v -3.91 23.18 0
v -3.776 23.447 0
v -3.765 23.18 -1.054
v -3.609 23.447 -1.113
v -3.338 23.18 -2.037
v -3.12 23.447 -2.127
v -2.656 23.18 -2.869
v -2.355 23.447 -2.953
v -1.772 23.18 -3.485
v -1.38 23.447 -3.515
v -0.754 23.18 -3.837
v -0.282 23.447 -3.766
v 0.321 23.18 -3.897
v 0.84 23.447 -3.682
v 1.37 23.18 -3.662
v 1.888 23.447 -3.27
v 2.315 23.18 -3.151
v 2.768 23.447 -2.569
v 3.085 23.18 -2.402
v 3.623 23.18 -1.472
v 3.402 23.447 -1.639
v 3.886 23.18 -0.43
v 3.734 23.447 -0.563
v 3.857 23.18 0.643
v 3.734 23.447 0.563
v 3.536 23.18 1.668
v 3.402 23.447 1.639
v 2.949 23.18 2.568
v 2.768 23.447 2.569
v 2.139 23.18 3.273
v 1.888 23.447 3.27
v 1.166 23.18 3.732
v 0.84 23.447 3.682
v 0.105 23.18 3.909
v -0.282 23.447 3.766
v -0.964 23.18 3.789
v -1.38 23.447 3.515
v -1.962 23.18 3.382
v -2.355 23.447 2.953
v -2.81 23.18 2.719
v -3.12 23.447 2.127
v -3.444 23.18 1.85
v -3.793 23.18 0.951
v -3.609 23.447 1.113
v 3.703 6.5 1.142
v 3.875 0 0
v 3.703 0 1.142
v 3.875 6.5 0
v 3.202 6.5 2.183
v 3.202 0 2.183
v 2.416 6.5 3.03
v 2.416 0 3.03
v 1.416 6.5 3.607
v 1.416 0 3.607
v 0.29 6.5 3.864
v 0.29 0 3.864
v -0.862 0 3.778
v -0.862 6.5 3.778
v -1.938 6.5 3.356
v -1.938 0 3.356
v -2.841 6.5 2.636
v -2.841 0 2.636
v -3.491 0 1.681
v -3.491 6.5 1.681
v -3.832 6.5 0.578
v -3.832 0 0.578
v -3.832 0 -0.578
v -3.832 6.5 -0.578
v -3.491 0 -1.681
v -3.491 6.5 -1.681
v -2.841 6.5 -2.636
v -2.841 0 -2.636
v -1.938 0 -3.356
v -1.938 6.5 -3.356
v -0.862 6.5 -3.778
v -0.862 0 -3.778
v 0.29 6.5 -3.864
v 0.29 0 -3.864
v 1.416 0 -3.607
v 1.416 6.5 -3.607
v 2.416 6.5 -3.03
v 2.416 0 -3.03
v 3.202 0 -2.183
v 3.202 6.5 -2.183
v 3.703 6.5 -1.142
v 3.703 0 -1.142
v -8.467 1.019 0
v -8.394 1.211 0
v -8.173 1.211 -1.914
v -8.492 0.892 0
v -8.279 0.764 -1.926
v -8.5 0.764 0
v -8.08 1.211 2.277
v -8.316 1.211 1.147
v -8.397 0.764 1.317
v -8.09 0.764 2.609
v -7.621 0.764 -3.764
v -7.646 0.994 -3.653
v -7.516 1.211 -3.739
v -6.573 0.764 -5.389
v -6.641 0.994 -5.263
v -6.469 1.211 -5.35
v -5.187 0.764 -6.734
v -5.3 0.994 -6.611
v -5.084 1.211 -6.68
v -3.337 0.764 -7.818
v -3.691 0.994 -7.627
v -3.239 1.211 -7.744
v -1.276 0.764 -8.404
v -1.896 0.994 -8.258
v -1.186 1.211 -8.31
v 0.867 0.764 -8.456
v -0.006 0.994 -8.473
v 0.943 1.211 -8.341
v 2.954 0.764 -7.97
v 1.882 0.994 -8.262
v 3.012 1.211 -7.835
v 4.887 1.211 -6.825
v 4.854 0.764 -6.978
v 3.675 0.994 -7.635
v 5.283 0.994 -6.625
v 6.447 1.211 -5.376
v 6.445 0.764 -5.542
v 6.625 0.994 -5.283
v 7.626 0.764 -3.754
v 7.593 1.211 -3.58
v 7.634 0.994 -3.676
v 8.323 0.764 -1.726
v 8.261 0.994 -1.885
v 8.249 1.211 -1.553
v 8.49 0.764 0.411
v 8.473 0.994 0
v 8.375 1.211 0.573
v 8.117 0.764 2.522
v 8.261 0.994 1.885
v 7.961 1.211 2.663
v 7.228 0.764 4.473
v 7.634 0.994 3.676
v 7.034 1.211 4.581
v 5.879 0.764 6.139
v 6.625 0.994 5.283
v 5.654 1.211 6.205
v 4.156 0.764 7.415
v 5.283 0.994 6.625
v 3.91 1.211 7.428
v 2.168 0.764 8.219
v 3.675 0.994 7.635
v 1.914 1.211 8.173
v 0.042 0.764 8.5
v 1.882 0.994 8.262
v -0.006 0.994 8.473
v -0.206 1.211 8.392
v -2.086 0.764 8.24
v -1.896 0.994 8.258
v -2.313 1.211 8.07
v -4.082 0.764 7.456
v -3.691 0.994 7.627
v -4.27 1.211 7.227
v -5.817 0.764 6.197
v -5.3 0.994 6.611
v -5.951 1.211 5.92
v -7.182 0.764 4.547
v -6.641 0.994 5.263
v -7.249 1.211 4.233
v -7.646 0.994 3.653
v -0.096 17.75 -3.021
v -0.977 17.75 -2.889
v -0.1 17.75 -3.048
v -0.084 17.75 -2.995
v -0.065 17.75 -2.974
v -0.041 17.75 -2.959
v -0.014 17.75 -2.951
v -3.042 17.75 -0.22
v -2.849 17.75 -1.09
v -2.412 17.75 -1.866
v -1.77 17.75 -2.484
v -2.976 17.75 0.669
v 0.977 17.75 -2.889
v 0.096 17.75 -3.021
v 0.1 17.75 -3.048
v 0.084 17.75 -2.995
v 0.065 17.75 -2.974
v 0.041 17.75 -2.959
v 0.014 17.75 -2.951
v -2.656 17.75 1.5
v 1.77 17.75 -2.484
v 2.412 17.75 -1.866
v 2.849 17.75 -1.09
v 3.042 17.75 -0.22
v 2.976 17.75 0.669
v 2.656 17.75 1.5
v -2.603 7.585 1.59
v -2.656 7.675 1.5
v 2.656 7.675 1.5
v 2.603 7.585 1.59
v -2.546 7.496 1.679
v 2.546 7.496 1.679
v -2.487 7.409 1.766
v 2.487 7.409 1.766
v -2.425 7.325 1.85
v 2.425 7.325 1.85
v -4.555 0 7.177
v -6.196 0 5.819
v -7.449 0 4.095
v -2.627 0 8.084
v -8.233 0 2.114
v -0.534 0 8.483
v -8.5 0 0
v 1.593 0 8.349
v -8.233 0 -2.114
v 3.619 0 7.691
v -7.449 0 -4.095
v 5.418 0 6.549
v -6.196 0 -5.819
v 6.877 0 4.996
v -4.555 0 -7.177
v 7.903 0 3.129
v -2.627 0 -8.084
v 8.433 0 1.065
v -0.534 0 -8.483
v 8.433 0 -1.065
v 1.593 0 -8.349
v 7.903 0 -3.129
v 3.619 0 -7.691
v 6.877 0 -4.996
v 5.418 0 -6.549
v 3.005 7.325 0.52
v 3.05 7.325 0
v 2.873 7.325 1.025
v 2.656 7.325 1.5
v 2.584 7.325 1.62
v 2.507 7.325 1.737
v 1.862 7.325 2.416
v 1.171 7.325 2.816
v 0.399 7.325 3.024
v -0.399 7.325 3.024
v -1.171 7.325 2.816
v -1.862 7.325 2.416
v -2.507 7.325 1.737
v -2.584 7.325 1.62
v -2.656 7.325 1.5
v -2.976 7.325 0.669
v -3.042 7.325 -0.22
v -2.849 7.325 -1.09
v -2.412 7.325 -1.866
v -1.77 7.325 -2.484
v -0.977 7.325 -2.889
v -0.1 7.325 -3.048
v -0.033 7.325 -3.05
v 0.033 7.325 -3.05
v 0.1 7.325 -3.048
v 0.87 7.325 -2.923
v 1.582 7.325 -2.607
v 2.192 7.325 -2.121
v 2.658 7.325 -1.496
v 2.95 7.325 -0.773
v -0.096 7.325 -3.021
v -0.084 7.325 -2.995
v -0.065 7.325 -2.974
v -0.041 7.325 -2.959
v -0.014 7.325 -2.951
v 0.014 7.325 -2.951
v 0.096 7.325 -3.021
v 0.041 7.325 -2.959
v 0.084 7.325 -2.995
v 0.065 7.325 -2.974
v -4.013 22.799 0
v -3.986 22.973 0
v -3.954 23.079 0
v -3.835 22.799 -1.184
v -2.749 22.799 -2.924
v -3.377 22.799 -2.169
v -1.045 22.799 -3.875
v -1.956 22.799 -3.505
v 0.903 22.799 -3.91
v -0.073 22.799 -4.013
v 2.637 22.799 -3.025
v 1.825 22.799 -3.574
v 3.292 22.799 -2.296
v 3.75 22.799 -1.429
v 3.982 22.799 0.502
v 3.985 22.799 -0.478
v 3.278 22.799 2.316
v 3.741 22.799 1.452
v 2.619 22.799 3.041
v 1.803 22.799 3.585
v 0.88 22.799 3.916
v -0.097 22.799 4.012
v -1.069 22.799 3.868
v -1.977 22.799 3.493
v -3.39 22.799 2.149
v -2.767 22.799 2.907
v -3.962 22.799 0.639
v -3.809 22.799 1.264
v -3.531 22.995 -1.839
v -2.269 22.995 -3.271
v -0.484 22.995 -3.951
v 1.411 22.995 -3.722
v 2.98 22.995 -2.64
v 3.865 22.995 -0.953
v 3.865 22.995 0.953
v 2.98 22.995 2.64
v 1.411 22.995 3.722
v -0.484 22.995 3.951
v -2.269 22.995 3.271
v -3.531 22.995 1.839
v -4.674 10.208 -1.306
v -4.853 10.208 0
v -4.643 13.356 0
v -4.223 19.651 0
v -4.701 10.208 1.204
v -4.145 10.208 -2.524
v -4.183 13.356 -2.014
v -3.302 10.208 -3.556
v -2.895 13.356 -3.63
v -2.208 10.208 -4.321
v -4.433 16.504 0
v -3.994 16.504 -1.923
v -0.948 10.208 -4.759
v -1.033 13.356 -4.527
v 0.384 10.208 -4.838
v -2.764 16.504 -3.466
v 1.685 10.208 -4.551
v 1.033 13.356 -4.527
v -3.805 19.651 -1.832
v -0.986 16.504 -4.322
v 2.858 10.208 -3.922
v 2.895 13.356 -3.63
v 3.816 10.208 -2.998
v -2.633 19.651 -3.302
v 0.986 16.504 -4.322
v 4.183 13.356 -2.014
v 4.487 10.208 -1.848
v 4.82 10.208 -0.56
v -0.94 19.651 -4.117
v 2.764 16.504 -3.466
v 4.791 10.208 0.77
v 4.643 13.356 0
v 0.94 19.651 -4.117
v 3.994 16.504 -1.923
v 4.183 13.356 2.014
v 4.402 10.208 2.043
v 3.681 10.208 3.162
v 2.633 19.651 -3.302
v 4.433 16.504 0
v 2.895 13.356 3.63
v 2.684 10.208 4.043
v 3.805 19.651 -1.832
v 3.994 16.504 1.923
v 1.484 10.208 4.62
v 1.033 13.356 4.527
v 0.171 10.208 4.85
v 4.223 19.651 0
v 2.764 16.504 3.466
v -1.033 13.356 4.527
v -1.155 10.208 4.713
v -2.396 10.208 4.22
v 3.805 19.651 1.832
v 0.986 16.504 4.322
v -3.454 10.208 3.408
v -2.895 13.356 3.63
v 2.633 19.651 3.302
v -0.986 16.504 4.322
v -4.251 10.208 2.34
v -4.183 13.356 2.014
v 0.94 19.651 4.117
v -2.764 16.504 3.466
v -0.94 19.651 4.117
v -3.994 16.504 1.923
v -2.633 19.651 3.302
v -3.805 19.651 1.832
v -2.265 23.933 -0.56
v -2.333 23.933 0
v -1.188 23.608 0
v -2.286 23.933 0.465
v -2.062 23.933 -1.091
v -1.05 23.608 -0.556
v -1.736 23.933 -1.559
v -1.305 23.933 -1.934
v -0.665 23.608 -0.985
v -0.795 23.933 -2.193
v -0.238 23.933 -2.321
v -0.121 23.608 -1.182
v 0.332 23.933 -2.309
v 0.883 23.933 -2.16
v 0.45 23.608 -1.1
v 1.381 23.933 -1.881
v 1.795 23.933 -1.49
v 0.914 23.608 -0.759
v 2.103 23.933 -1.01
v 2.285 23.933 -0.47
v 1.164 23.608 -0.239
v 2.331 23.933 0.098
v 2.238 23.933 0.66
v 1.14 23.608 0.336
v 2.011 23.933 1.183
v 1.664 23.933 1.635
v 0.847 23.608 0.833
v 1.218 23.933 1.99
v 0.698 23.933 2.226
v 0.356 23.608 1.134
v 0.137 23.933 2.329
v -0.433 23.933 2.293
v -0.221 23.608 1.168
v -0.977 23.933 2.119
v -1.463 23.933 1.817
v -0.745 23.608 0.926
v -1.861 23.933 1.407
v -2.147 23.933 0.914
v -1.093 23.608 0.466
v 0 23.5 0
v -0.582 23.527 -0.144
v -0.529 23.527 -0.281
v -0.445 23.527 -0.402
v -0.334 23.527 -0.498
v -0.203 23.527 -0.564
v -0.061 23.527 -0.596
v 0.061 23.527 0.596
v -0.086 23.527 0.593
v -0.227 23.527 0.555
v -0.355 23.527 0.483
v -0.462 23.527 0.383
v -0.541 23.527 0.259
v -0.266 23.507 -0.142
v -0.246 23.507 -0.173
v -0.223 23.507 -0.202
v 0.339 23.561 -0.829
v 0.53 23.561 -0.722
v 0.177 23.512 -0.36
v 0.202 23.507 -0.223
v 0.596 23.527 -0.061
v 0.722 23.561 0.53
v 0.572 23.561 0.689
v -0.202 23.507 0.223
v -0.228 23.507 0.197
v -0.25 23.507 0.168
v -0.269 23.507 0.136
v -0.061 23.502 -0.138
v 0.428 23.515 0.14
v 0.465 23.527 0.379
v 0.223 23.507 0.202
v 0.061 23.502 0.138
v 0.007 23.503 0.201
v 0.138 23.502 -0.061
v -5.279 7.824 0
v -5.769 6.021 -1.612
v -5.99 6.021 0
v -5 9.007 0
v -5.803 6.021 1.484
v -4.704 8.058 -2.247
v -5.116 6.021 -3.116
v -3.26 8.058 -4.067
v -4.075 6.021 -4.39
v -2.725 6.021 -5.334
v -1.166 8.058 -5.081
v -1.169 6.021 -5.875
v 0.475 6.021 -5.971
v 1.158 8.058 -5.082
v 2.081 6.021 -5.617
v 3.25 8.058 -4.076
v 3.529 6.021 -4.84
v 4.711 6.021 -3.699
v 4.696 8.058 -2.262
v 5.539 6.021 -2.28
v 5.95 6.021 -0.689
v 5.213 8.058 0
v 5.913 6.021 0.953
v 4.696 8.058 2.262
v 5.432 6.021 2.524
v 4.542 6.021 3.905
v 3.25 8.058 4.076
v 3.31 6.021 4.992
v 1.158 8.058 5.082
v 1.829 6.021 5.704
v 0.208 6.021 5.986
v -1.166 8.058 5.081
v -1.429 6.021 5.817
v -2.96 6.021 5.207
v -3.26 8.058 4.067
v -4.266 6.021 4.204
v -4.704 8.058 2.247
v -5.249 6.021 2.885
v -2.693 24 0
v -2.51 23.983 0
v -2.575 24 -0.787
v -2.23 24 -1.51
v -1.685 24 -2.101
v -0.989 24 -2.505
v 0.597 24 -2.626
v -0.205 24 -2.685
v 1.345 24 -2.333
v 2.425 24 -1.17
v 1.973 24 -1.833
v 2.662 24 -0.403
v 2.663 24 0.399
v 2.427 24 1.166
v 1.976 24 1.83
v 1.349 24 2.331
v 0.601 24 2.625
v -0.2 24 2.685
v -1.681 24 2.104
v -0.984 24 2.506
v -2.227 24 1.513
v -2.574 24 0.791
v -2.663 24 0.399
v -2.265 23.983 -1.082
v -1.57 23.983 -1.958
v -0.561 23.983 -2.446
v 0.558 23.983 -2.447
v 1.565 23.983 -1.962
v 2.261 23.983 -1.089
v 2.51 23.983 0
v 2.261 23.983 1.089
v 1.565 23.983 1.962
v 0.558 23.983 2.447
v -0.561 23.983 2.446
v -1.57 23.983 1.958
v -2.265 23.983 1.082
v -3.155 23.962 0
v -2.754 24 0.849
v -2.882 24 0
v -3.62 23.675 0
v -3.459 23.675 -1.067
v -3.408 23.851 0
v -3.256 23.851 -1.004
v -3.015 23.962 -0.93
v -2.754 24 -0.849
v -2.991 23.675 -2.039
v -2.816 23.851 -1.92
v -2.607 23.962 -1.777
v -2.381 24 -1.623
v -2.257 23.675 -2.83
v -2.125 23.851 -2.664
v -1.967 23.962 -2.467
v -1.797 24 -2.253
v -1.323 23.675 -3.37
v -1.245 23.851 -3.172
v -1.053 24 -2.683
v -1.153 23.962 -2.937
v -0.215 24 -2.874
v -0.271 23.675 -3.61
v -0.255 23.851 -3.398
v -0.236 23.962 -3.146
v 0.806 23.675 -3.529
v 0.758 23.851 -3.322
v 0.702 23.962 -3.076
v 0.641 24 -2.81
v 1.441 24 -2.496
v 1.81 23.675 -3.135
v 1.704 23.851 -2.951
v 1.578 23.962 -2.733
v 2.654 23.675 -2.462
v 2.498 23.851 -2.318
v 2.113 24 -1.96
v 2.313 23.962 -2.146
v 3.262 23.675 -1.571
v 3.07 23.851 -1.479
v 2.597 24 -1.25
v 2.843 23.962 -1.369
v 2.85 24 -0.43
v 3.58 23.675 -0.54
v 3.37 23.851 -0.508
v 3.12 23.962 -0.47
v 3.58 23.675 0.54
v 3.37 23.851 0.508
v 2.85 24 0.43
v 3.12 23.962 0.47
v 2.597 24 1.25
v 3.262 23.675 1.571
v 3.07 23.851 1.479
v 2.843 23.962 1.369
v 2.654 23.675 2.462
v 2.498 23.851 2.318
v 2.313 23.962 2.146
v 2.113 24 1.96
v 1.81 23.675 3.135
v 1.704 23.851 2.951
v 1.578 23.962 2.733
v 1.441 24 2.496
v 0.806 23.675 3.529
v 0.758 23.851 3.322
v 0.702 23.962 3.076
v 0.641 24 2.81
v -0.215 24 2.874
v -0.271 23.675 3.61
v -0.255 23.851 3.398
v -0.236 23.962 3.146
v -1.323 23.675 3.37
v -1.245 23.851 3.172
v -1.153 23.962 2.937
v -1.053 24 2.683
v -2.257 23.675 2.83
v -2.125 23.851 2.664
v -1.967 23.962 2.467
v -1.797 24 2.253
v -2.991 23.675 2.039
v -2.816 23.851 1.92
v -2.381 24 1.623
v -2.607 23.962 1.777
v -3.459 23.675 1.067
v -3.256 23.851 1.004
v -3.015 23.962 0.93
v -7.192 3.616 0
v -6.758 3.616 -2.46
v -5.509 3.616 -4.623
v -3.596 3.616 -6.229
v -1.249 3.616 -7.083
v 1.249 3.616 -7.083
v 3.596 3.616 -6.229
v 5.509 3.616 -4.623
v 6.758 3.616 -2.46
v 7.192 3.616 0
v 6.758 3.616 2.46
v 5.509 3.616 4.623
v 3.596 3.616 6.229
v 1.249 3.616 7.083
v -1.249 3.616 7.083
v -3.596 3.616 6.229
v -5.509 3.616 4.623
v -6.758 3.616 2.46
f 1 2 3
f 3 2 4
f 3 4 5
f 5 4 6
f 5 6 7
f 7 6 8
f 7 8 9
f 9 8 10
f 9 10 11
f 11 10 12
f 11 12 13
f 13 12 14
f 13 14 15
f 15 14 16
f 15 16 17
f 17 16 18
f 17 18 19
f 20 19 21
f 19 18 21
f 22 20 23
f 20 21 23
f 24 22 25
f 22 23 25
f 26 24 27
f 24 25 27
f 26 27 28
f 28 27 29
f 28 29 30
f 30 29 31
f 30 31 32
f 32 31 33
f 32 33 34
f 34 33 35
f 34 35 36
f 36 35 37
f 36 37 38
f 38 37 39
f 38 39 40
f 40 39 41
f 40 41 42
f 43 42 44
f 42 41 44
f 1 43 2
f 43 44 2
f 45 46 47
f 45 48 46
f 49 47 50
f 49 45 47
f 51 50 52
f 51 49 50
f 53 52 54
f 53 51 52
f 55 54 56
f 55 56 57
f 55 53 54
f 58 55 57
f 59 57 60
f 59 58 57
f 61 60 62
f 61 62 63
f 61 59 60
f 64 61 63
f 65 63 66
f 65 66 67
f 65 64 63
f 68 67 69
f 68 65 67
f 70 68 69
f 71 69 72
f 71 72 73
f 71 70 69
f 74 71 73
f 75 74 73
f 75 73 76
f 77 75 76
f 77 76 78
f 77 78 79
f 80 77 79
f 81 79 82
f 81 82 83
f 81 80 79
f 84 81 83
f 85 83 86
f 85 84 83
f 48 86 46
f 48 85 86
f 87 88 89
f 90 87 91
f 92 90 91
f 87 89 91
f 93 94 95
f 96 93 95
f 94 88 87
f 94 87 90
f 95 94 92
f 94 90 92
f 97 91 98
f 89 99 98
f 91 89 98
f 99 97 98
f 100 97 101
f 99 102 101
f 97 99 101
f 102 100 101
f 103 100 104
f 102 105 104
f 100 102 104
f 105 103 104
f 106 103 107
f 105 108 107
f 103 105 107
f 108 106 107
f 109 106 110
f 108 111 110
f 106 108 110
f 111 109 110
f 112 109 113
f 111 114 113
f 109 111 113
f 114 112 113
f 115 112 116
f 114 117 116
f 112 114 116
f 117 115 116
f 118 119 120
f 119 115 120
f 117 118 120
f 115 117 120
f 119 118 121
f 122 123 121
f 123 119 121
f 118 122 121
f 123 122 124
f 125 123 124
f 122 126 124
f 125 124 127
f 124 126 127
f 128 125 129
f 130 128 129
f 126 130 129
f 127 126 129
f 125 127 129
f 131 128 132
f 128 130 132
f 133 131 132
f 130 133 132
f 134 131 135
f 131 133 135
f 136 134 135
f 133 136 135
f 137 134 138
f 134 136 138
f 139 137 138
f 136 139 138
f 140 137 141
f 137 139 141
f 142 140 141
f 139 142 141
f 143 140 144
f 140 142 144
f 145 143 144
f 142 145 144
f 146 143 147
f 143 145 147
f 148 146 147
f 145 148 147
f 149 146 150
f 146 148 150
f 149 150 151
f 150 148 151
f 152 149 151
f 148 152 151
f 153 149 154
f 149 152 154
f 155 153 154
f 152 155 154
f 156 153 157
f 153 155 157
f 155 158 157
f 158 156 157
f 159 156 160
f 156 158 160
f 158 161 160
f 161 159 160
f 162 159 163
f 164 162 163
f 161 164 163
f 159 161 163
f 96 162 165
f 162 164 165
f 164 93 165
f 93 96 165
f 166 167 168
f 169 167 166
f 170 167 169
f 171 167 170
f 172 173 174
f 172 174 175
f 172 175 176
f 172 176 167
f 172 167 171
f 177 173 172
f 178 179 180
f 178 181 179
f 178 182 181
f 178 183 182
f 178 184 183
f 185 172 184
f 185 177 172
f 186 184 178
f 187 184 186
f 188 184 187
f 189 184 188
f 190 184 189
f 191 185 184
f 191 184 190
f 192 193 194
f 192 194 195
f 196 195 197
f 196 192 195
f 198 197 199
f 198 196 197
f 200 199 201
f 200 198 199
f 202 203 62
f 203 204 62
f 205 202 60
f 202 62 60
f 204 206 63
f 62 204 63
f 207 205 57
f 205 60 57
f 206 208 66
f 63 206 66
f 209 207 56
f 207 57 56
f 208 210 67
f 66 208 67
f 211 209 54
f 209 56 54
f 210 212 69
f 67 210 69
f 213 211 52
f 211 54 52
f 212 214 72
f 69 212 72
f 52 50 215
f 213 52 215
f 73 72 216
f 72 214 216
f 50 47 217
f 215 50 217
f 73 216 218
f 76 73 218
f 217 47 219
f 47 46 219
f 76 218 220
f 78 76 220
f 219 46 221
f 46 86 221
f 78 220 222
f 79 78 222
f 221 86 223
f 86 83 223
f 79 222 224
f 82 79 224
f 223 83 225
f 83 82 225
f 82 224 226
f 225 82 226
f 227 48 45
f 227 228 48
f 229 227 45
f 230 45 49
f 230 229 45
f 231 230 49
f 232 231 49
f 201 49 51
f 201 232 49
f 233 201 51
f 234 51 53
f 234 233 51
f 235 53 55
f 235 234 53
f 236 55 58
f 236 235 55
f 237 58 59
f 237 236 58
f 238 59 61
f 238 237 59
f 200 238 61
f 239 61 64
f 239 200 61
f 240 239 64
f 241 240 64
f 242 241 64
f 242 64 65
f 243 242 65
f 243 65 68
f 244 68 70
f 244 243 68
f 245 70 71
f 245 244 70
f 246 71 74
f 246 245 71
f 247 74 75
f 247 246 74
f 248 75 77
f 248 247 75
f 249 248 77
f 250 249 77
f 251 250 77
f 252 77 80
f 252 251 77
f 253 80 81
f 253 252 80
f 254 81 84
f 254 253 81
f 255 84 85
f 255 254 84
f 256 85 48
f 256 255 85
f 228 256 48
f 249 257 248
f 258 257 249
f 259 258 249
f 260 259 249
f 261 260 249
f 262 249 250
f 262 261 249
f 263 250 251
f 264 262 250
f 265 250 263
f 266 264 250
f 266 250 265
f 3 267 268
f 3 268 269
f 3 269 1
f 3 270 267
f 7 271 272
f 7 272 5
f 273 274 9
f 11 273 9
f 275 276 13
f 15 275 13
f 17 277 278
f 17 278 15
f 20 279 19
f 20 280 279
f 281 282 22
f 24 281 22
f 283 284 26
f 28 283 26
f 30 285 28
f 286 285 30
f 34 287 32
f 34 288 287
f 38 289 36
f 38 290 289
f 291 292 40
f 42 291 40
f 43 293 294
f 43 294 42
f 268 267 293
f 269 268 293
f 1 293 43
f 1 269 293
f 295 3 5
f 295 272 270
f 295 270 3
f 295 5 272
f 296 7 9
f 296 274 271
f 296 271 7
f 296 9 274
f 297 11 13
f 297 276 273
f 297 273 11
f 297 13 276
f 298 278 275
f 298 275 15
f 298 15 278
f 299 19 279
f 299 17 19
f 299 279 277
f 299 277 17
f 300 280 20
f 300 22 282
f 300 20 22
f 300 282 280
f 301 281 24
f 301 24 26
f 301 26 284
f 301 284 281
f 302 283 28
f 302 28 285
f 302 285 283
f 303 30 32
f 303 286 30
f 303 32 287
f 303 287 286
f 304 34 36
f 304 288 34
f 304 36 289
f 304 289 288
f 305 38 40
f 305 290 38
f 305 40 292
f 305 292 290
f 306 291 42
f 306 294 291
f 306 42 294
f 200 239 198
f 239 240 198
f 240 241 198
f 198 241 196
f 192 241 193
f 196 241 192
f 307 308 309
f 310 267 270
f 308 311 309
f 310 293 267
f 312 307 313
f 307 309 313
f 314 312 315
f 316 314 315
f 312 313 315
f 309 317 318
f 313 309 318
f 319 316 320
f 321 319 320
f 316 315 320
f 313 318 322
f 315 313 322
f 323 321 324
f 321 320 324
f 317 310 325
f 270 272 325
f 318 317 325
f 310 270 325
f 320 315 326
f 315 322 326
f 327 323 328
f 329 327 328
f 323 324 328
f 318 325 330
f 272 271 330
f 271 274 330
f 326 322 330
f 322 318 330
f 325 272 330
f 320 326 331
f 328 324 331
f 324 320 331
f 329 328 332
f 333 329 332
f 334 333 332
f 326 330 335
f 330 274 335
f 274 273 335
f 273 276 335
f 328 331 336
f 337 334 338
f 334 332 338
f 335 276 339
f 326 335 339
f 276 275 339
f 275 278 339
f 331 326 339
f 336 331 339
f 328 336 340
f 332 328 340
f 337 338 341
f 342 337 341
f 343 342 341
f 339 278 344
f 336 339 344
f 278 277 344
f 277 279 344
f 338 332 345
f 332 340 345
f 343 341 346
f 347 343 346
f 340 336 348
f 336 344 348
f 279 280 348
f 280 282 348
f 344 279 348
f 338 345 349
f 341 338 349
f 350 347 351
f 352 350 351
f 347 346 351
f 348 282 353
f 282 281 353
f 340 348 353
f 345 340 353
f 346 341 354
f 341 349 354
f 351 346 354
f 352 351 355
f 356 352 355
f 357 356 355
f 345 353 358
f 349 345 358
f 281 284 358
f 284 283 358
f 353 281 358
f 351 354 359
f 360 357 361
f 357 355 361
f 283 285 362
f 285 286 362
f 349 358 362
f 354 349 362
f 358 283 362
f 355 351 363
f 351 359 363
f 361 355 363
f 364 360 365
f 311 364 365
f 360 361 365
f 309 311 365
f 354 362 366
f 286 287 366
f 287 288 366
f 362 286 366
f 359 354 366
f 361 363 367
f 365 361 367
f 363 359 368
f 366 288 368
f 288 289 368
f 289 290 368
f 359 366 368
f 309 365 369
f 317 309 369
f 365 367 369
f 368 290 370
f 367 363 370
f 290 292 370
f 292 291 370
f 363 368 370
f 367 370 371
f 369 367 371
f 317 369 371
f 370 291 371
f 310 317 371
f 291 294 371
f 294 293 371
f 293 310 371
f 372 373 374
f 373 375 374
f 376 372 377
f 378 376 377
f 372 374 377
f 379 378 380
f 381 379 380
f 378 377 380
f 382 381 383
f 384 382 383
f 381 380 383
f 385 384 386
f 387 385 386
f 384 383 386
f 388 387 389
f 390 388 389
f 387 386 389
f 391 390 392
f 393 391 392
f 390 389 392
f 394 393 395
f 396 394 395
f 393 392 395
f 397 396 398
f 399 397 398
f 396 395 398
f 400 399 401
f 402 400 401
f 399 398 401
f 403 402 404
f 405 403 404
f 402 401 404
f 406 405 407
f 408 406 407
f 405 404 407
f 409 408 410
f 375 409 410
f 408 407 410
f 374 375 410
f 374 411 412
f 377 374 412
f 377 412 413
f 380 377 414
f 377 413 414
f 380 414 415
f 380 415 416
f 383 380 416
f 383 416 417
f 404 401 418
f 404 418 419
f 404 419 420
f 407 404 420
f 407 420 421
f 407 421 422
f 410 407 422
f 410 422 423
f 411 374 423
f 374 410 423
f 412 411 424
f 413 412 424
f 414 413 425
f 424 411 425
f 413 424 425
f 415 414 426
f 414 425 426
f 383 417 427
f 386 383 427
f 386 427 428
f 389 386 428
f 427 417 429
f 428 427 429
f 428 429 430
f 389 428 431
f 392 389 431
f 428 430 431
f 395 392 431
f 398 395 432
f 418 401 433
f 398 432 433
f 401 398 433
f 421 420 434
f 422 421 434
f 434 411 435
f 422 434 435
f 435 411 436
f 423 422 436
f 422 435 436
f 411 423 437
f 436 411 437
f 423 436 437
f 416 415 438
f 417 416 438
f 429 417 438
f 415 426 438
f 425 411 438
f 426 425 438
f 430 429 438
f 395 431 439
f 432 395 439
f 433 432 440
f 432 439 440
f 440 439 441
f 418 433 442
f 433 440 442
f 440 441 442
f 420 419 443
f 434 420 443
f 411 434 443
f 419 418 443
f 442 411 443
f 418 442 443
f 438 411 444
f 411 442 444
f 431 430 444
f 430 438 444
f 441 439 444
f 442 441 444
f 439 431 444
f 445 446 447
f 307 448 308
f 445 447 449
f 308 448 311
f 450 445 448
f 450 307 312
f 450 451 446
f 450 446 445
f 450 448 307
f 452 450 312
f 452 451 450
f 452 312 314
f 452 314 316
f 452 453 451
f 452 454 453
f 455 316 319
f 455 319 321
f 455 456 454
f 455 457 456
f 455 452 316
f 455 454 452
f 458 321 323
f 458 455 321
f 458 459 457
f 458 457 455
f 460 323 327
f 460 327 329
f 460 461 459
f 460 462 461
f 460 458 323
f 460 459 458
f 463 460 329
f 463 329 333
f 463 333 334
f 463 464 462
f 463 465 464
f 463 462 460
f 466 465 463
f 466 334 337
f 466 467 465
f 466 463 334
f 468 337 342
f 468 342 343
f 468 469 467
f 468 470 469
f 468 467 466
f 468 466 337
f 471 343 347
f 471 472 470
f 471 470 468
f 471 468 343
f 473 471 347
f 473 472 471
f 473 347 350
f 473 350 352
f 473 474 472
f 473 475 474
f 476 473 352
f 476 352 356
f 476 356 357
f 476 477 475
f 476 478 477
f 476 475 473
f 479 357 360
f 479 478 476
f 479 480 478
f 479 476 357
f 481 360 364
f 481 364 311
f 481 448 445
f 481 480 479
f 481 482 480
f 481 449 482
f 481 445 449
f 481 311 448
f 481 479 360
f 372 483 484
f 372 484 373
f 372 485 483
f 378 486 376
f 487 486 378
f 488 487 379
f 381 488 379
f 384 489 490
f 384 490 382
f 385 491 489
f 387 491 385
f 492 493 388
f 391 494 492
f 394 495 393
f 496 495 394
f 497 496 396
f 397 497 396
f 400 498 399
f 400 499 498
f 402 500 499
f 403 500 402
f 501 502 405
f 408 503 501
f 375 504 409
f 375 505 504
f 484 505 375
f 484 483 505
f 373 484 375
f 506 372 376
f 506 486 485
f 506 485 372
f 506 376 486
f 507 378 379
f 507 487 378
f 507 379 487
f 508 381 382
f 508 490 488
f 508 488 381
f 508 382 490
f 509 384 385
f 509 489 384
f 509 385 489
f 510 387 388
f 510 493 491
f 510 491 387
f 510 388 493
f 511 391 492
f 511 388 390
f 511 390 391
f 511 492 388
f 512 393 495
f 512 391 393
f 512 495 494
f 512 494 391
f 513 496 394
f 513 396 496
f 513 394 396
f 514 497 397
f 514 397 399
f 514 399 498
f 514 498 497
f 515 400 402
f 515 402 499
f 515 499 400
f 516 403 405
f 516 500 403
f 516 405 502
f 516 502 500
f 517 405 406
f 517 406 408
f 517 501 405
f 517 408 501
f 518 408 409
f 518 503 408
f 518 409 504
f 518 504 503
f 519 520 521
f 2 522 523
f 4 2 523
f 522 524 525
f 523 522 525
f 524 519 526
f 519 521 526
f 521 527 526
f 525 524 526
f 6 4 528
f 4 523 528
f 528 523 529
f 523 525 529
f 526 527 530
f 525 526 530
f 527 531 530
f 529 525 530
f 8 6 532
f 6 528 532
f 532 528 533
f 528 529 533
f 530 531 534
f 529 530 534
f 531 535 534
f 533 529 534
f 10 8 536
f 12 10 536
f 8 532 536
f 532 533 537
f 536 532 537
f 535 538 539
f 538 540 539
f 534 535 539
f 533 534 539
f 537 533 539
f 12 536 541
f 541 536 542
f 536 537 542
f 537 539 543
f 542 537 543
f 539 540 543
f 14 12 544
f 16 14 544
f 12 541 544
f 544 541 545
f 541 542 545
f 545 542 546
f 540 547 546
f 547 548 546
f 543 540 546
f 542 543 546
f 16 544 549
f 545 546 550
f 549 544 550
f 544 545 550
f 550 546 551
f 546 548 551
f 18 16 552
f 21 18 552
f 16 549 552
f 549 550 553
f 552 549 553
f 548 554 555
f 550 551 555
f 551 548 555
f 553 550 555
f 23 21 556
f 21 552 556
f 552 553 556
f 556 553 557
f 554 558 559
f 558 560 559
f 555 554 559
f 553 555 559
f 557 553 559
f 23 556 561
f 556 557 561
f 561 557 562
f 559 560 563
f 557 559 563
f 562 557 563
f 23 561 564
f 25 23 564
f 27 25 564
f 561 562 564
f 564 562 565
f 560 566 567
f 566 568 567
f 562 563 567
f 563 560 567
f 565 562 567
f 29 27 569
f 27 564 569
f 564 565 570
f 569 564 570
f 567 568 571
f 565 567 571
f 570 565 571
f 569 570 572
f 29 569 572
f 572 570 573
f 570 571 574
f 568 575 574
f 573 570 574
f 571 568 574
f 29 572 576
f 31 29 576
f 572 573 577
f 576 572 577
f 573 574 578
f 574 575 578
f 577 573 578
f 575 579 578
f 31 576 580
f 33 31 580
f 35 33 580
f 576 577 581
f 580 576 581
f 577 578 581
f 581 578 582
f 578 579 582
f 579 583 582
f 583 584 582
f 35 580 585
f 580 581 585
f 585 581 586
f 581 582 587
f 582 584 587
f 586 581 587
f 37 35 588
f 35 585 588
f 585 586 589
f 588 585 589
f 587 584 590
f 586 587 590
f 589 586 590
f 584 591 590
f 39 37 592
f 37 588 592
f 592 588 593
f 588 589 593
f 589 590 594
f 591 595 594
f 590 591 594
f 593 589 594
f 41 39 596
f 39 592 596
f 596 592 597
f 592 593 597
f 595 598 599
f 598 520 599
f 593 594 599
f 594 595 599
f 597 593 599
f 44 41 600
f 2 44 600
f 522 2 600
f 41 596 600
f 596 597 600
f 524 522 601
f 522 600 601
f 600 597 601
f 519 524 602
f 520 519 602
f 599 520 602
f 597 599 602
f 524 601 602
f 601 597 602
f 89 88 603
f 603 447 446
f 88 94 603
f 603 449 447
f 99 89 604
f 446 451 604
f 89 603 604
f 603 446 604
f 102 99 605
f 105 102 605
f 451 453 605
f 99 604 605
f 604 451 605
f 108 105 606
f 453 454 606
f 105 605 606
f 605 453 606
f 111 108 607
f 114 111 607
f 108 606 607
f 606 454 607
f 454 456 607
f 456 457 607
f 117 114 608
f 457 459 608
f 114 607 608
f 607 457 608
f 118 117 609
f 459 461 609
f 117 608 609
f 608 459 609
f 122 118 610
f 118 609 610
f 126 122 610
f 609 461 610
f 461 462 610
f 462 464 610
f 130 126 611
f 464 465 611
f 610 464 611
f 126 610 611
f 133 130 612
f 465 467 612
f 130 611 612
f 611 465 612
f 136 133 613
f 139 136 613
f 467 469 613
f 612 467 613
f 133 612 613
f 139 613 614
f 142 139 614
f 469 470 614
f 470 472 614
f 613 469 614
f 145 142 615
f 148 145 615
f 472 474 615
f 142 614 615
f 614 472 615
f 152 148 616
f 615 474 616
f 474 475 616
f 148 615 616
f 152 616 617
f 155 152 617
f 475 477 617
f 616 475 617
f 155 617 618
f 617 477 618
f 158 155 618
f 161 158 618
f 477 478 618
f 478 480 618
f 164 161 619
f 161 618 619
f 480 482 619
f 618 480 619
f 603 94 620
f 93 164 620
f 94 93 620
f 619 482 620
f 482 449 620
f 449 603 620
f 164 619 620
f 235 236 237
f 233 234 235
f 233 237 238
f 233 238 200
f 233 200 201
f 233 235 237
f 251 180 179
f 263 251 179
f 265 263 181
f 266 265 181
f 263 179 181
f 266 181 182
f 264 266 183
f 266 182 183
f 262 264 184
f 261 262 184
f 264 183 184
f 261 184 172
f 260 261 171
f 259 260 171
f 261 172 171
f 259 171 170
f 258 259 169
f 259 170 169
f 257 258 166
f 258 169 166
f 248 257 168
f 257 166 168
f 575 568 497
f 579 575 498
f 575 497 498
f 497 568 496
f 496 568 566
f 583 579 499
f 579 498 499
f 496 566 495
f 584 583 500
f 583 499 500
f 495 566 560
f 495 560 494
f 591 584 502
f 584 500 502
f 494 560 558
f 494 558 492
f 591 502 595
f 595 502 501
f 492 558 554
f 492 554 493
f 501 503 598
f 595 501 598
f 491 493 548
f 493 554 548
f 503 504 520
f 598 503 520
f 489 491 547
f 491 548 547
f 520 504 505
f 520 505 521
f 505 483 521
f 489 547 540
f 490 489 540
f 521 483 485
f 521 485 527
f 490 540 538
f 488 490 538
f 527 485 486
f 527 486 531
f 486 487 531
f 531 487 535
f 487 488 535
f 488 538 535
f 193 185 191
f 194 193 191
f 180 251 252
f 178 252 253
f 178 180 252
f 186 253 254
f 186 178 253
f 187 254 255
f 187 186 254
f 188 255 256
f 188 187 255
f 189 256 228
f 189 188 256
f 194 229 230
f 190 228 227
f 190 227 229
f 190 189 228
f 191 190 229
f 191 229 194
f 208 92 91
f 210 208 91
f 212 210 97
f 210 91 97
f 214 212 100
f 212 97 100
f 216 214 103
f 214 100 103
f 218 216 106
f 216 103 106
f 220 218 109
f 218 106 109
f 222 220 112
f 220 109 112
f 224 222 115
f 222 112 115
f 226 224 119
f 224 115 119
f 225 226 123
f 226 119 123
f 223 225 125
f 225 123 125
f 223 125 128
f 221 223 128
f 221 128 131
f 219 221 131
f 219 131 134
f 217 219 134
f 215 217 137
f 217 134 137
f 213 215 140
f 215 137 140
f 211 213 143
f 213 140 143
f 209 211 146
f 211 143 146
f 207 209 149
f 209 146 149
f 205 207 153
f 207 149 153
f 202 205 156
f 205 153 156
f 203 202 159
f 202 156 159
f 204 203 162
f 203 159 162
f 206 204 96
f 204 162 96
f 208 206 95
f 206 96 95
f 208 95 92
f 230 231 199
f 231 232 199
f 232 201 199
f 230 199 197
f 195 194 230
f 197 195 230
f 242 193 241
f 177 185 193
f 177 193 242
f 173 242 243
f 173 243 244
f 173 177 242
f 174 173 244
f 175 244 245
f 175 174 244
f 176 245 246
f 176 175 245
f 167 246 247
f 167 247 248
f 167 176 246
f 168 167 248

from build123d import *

# Parameters (mm, degrees)
FILLET1_R           = 11
FILLET2_R           = 1
BOSS_EXTRUDE1_DEPTH = 10.425
CHAMFER1_SIZE       = 0.35


with BuildPart() as part:
    # Sketch1 → Revolve1 (revolve)
    with BuildSketch(Plane.XY, mode=Mode.PRIVATE) as revolve1_sk:
        with BuildLine():
            Line((0, 0), (8.5, 0))
            Line((8.5, 0), (8.5, 1))
            Line((8.5, 1), (5, 8))
            Line((5, 8), (4, 23))
            Line((4, 23), (3.5, 24))
            Line((3.5, 24), (2.5, 24))
            add(Edge.make_bspline(
                [(2.5, 24), (1.3, 23.5), (0, 23.5)],
                knots=[0, 0, 0, 1, 1, 1], degree=2))
            Line((0, 23.5), (0, 0))
        make_face()
    revolve(revolve1_sk.sketch.rotate(Axis((0, 23.5, 0), (0, -1, 0)), 180), axis=Axis((0, 23.5, 0), (0, -1, 0)))

    # Fillet1
    fillet1_edges = [part.edges().sort_by_distance(p)[0] for p in [
        (5, 8, 0),
    ]]
    fillet(fillet1_edges, radius=FILLET1_R)

    # Fillet2
    fillet2_edges = [part.edges().sort_by_distance(p)[0] for p in [
        (2.5, 24, 0),
        (3.5, 24, 0),
        (4, 23, 0),
        (8.5, 1, 0),
    ]]
    fillet(fillet2_edges, radius=FILLET2_R)

    # Sketch3 → Cut-Revolve1 (revolve, cut)
    with BuildSketch(Plane.XY):
        Polygon((0, 0), (3.875, 0), (3.875, 6.5), (3.05, 7.325), (3.05, 17.75), (0, 17.75), align=None)
    revolve(axis=Axis((0, 17.75, 0), (0, -1, 0)), mode=Mode.SUBTRACT)

    # Sketch4 → Boss-Extrude1 (add)
    with BuildSketch(Plane.XZ.offset(-17.75)):
        with BuildLine():
            Line((-2.655654345, 1.5), (2.655654345, 1.5))
            ThreePointArc((2.655654345, 1.5), (0, 3.05), (-2.655654345, 1.5))
        make_face()
        with BuildLine():
            ThreePointArc((-0.099986562, -3.048360656), (0, -3.05), (0.099986562, -3.048360656))
            ThreePointArc((0.099986562, -3.048360656), (0, -2.95), (-0.099986562, -3.048360656))
        make_face()
    extrude(amount=BOSS_EXTRUDE1_DEPTH)

    # Chamfer1
    # the kernel refuses this chamfer: 0.35 mm, written as the material it takes off along each edge
    with BuildSketch(Plane(origin=(-3.555743391, 7.325, 1.5), x_dir=(0, 0.9996219169112968, -0.027495876610586154), z_dir=(1, 0, 0))) as chamfer1_piece_1_section:
        Polygon((CHAMFER1_SIZE * 0.999621916911, CHAMFER1_SIZE * 0.0274958766106), (-CHAMFER1_SIZE * 0.0274958766106, CHAMFER1_SIZE * 0.999621916911), (0, 0), align=None)
    chamfer1_piece_1 = extrude(amount=7.111486782, mode=Mode.PRIVATE)
    chamfer1_piece_1 = chamfer1_piece_1 & Plane(origin=(0, 7.499624527, 0), x_dir=(1, 0, 0), z_dir=(0, 1, 0)) * Cylinder(3.05, 16, mode=Mode.PRIVATE)
    add(chamfer1_piece_1, mode=Mode.SUBTRACT)


solid = part.part
